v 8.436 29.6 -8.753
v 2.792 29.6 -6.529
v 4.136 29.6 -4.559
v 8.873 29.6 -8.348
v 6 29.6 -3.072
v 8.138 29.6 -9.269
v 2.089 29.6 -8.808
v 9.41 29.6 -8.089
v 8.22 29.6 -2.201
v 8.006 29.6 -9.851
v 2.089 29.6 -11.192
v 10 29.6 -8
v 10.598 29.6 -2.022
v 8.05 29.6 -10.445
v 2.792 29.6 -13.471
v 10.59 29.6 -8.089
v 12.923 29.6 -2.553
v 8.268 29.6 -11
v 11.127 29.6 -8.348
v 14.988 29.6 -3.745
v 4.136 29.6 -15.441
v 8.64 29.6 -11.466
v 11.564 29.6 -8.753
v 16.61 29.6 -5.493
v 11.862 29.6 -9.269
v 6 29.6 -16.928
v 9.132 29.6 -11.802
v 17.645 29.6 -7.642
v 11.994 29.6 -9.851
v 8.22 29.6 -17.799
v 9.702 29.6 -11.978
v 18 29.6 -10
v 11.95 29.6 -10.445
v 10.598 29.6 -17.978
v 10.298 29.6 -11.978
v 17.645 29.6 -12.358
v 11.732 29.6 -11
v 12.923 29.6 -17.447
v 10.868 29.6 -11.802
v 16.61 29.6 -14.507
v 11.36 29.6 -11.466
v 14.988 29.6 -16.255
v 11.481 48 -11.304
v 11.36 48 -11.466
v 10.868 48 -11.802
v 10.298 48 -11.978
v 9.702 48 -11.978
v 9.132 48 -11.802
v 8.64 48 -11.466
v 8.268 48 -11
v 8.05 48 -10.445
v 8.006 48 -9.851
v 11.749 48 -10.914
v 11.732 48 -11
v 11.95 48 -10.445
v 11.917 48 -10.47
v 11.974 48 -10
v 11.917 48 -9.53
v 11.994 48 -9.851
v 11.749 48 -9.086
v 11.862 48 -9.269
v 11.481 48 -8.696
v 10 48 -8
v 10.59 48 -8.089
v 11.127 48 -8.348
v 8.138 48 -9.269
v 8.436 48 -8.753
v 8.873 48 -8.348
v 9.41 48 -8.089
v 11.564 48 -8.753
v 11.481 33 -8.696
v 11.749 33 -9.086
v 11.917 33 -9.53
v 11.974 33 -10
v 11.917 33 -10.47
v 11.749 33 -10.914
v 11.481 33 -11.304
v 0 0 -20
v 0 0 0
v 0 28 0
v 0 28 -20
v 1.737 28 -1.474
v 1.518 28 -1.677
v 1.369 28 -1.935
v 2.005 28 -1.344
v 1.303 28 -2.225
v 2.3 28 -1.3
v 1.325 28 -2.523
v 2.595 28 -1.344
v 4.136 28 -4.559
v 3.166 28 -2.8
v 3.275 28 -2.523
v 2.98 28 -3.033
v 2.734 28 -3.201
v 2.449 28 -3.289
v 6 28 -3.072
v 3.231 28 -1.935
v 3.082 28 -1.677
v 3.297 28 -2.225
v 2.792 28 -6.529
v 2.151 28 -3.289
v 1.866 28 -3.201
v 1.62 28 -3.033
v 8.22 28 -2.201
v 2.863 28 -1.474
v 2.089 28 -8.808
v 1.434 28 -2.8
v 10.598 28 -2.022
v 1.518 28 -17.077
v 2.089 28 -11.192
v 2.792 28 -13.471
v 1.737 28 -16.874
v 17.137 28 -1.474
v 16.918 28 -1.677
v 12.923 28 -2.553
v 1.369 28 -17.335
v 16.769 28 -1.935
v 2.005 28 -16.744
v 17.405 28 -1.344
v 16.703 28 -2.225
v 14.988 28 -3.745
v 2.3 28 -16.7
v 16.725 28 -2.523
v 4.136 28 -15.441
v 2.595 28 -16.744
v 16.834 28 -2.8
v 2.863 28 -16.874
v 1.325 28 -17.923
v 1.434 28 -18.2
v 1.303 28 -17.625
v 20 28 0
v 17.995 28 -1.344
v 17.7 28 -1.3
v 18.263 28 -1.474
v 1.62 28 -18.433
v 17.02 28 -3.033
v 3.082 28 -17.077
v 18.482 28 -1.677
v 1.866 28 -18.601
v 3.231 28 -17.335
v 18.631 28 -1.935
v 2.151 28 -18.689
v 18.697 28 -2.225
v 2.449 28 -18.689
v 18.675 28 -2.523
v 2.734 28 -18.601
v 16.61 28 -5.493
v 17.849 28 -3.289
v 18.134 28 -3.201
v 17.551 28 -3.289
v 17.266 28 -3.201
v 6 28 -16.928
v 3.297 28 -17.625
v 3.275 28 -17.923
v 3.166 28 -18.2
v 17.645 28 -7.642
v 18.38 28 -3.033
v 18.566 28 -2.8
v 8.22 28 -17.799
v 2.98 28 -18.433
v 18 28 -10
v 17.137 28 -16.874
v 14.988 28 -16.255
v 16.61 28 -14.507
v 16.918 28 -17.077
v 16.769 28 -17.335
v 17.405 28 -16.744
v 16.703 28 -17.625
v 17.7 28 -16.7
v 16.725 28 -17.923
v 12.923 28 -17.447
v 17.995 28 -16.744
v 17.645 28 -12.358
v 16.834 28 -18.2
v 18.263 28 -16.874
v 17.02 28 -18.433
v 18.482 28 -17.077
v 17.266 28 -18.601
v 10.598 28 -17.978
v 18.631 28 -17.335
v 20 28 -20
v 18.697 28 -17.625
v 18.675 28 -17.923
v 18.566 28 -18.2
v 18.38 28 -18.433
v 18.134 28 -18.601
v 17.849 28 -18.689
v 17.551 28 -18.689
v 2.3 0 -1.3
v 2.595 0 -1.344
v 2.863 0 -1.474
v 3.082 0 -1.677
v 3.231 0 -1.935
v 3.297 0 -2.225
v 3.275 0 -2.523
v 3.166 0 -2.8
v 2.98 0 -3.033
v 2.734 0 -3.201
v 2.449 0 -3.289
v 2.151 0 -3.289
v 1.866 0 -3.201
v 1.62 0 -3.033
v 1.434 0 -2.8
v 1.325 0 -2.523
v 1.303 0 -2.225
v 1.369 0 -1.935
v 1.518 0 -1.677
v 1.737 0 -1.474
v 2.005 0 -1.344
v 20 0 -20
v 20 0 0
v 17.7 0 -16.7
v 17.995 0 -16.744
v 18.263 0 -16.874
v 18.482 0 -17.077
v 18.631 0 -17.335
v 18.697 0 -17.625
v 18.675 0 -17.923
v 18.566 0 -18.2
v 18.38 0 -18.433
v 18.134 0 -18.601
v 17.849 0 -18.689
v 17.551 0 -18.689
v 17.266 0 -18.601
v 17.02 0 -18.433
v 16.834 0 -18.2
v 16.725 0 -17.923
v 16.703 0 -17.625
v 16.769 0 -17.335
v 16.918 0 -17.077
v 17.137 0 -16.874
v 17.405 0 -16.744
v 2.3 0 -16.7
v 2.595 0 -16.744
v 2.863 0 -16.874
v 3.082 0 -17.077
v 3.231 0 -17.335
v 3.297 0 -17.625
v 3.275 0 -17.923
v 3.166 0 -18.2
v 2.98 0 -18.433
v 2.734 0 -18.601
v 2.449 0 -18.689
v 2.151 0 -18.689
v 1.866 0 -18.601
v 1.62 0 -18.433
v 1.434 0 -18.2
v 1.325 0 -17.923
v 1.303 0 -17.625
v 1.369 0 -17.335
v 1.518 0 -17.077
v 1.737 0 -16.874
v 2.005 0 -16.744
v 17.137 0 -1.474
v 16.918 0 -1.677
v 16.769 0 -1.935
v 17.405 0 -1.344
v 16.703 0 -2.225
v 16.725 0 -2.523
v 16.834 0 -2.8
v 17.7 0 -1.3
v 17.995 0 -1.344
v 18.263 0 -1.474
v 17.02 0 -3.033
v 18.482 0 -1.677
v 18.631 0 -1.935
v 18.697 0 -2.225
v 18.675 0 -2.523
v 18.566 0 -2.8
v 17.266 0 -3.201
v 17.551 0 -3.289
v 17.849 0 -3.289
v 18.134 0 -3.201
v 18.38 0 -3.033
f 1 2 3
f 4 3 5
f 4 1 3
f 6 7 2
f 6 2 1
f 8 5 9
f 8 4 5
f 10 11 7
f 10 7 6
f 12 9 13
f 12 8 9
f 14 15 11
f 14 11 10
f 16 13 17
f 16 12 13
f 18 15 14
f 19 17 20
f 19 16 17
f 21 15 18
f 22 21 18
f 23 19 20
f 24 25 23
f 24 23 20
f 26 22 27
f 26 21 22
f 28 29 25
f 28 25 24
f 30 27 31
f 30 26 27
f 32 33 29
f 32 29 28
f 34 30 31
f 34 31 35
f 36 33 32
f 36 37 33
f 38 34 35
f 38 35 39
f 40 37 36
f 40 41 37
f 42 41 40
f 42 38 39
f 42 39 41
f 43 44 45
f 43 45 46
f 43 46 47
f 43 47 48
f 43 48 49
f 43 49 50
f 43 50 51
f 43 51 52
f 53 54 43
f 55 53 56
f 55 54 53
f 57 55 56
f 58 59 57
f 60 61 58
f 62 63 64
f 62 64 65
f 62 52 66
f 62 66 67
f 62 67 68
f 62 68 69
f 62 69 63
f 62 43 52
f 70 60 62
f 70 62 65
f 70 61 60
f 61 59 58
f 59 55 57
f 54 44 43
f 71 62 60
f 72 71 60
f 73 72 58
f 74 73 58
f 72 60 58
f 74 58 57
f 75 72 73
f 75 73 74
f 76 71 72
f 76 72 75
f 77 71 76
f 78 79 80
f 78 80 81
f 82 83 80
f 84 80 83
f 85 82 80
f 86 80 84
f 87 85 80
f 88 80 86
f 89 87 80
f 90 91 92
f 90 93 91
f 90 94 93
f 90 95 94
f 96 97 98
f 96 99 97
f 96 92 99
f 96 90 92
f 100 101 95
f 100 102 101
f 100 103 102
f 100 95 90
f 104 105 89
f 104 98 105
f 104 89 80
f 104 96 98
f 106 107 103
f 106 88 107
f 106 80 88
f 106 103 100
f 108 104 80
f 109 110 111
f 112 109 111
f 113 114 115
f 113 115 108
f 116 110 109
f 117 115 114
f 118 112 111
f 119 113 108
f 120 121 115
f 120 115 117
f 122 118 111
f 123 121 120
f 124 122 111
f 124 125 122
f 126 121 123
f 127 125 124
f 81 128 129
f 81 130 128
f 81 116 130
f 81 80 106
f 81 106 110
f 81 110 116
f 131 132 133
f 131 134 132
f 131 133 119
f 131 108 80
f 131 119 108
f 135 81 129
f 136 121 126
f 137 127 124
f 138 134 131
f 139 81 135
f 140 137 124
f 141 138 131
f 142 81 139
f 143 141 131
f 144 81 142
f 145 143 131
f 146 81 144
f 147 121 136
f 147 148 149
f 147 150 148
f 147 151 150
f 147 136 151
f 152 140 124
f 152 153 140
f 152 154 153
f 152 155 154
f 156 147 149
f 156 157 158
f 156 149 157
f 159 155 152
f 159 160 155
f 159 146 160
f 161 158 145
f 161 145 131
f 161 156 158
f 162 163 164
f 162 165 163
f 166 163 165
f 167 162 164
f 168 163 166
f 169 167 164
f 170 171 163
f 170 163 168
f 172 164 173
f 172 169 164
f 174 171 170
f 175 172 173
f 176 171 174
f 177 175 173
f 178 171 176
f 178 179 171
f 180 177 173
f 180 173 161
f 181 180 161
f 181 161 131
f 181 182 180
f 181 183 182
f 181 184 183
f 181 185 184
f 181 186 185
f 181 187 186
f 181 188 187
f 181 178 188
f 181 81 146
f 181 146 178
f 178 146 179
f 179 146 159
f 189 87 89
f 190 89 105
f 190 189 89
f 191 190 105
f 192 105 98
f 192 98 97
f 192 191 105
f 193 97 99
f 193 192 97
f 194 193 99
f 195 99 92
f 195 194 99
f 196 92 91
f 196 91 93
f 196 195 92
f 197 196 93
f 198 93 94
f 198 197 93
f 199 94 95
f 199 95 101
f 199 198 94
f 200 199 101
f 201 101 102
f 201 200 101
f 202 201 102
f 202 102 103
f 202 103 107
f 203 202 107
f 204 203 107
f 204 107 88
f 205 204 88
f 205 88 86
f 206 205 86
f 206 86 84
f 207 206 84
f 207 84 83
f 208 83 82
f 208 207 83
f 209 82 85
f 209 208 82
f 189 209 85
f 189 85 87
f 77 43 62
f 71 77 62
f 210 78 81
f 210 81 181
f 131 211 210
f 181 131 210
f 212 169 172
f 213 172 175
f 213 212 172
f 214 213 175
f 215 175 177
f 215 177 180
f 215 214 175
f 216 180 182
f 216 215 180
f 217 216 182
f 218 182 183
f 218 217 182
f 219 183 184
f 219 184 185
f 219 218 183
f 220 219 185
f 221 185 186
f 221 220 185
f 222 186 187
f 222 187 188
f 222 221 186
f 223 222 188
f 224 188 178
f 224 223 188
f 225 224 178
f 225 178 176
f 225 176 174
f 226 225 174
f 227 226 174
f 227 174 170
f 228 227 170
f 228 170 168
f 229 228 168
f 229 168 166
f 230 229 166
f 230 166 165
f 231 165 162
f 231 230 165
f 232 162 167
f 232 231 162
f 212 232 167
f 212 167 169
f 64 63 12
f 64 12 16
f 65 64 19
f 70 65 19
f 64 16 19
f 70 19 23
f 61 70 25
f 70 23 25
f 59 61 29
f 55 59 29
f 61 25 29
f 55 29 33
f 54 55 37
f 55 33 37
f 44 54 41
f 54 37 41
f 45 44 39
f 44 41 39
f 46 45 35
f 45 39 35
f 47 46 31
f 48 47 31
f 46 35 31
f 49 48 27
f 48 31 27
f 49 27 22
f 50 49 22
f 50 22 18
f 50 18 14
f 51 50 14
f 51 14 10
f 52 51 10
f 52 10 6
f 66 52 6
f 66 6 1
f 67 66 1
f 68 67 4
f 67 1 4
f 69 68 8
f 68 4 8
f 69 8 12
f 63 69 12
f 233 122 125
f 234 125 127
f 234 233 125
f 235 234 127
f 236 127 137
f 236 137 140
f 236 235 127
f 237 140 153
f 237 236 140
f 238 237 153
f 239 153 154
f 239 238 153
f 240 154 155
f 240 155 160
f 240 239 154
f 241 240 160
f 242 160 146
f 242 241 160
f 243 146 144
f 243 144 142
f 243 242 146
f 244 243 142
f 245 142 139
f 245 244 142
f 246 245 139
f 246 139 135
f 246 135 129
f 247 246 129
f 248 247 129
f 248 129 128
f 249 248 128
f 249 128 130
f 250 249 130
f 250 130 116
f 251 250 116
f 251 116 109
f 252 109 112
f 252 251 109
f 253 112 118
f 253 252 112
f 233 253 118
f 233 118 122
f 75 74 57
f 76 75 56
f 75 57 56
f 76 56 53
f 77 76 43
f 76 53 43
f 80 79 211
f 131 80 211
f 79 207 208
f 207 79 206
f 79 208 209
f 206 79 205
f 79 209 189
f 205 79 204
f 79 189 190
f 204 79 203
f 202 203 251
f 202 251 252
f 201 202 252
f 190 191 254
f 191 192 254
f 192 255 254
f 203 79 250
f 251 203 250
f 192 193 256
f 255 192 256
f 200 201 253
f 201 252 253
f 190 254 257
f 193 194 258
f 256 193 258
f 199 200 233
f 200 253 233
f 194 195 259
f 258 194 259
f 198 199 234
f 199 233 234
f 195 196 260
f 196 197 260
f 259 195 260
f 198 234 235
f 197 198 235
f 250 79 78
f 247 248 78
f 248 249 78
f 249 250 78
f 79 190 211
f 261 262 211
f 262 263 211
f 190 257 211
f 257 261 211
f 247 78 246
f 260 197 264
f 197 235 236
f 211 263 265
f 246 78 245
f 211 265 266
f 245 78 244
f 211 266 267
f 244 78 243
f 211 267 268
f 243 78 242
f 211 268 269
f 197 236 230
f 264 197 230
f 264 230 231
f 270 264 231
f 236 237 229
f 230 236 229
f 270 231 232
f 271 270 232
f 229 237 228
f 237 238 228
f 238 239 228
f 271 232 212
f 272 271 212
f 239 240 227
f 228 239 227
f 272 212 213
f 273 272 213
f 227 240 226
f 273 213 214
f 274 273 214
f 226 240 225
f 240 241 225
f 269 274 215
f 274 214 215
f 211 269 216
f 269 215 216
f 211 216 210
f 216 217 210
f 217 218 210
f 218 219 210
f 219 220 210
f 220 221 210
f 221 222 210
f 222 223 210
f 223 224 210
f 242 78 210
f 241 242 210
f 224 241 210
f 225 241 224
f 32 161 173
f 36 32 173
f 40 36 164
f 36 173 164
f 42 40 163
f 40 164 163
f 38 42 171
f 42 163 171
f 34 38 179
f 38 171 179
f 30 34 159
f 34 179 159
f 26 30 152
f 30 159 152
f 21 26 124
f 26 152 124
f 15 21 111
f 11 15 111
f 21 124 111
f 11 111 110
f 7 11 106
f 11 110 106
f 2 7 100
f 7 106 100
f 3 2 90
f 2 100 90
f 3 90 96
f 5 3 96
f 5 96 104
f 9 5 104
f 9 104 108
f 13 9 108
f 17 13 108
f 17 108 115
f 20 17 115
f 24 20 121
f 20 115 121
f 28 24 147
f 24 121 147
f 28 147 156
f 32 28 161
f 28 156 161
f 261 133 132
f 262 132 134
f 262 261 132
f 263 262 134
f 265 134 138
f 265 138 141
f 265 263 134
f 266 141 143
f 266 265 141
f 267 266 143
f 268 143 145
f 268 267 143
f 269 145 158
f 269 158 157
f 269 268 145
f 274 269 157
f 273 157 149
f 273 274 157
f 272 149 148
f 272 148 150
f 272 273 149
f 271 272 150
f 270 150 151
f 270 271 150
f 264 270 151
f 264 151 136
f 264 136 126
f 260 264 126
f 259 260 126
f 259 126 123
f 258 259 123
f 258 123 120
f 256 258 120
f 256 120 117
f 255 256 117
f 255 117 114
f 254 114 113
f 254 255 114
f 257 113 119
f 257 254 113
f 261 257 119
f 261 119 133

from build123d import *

# Parameters (mm, degrees)
SKETCH_1_W          = 20
SKETCH_1_H          = 20
SKETCH_1_R          = 1
EXTRUDE_1_DEPTH     = 28
EXTRUDE_2_DEPTH     = 1.6
SKETCH_3_R          = 2
EXTRUDE_3_DEPTH     = 18.4
CUT_EXTRUDE_1_DEPTH = 15


with BuildPart() as part:
    # 草图1 → 凸台-拉伸1 (new body)
    with BuildSketch(Plane(origin=(0, 0, 0), x_dir=(1, 0, 0), z_dir=(0, 1, 0))):
        with Locations((10, 10)):
            Rectangle(SKETCH_1_W, SKETCH_1_H)
        with Locations(Location((17.7, 2.3, 0), (0, 0, 270))):
            Circle(SKETCH_1_R, mode=Mode.SUBTRACT)
        with Locations(Location((17.7, 17.7, 0), (0, 0, 270))):
            Circle(SKETCH_1_R, mode=Mode.SUBTRACT)
        with Locations(Location((2.3, 17.7, 0), (0, 0, 270))):
            Circle(SKETCH_1_R, mode=Mode.SUBTRACT)
        with Locations(Location((2.3, 2.3, 0), (0, 0, 270))):
            Circle(SKETCH_1_R, mode=Mode.SUBTRACT)
    extrude(amount=EXTRUDE_1_DEPTH)

    # 草图2 → 凸台-拉伸2 (add)
    with BuildSketch(Plane(origin=(0, 28, 0), x_dir=(1, 0, 0), z_dir=(0, 1, 0))):
        with BuildLine():
            ThreePointArc((2, 10), (10, 2), (18, 10))
            Line((18, 10), (2, 10))
        make_face()
        with BuildLine():
            Line((2, 10), (18, 10))
            ThreePointArc((18, 10), (10, 18), (2, 10))
        make_face()
    extrude(amount=EXTRUDE_2_DEPTH)

    # 草图3 → 凸台-拉伸3 (add)
    with BuildSketch(Plane(origin=(0, 29.6, 0), x_dir=(1, 0, 0), z_dir=(0, 1, 0))):
        with Locations(Location((10, 10, 0), (0, 0, 270))):
            Circle(SKETCH_3_R)
    extrude(amount=EXTRUDE_3_DEPTH)

    # 草图4 → 切除-拉伸1 (cut)
    with BuildSketch(Plane(origin=(0, 48, 0), x_dir=(1, 0, 0), z_dir=(0, 1, 0))):
        with BuildLine():
            Line((11.481279617, 11.304155273), (11.481279617, 10))
            Line((11.481279617, 10), (11.481279617, 8.695844727))
            ThreePointArc((11.481279617, 8.695844727), (11.846406131, 9.303010274), (11.97357804, 10))
            ThreePointArc((11.97357804, 10), (11.846406131, 10.696989726), (11.481279617, 11.304155273))
        make_face()
    extrude(amount=-CUT_EXTRUDE_1_DEPTH, mode=Mode.SUBTRACT)


solid = part.part
